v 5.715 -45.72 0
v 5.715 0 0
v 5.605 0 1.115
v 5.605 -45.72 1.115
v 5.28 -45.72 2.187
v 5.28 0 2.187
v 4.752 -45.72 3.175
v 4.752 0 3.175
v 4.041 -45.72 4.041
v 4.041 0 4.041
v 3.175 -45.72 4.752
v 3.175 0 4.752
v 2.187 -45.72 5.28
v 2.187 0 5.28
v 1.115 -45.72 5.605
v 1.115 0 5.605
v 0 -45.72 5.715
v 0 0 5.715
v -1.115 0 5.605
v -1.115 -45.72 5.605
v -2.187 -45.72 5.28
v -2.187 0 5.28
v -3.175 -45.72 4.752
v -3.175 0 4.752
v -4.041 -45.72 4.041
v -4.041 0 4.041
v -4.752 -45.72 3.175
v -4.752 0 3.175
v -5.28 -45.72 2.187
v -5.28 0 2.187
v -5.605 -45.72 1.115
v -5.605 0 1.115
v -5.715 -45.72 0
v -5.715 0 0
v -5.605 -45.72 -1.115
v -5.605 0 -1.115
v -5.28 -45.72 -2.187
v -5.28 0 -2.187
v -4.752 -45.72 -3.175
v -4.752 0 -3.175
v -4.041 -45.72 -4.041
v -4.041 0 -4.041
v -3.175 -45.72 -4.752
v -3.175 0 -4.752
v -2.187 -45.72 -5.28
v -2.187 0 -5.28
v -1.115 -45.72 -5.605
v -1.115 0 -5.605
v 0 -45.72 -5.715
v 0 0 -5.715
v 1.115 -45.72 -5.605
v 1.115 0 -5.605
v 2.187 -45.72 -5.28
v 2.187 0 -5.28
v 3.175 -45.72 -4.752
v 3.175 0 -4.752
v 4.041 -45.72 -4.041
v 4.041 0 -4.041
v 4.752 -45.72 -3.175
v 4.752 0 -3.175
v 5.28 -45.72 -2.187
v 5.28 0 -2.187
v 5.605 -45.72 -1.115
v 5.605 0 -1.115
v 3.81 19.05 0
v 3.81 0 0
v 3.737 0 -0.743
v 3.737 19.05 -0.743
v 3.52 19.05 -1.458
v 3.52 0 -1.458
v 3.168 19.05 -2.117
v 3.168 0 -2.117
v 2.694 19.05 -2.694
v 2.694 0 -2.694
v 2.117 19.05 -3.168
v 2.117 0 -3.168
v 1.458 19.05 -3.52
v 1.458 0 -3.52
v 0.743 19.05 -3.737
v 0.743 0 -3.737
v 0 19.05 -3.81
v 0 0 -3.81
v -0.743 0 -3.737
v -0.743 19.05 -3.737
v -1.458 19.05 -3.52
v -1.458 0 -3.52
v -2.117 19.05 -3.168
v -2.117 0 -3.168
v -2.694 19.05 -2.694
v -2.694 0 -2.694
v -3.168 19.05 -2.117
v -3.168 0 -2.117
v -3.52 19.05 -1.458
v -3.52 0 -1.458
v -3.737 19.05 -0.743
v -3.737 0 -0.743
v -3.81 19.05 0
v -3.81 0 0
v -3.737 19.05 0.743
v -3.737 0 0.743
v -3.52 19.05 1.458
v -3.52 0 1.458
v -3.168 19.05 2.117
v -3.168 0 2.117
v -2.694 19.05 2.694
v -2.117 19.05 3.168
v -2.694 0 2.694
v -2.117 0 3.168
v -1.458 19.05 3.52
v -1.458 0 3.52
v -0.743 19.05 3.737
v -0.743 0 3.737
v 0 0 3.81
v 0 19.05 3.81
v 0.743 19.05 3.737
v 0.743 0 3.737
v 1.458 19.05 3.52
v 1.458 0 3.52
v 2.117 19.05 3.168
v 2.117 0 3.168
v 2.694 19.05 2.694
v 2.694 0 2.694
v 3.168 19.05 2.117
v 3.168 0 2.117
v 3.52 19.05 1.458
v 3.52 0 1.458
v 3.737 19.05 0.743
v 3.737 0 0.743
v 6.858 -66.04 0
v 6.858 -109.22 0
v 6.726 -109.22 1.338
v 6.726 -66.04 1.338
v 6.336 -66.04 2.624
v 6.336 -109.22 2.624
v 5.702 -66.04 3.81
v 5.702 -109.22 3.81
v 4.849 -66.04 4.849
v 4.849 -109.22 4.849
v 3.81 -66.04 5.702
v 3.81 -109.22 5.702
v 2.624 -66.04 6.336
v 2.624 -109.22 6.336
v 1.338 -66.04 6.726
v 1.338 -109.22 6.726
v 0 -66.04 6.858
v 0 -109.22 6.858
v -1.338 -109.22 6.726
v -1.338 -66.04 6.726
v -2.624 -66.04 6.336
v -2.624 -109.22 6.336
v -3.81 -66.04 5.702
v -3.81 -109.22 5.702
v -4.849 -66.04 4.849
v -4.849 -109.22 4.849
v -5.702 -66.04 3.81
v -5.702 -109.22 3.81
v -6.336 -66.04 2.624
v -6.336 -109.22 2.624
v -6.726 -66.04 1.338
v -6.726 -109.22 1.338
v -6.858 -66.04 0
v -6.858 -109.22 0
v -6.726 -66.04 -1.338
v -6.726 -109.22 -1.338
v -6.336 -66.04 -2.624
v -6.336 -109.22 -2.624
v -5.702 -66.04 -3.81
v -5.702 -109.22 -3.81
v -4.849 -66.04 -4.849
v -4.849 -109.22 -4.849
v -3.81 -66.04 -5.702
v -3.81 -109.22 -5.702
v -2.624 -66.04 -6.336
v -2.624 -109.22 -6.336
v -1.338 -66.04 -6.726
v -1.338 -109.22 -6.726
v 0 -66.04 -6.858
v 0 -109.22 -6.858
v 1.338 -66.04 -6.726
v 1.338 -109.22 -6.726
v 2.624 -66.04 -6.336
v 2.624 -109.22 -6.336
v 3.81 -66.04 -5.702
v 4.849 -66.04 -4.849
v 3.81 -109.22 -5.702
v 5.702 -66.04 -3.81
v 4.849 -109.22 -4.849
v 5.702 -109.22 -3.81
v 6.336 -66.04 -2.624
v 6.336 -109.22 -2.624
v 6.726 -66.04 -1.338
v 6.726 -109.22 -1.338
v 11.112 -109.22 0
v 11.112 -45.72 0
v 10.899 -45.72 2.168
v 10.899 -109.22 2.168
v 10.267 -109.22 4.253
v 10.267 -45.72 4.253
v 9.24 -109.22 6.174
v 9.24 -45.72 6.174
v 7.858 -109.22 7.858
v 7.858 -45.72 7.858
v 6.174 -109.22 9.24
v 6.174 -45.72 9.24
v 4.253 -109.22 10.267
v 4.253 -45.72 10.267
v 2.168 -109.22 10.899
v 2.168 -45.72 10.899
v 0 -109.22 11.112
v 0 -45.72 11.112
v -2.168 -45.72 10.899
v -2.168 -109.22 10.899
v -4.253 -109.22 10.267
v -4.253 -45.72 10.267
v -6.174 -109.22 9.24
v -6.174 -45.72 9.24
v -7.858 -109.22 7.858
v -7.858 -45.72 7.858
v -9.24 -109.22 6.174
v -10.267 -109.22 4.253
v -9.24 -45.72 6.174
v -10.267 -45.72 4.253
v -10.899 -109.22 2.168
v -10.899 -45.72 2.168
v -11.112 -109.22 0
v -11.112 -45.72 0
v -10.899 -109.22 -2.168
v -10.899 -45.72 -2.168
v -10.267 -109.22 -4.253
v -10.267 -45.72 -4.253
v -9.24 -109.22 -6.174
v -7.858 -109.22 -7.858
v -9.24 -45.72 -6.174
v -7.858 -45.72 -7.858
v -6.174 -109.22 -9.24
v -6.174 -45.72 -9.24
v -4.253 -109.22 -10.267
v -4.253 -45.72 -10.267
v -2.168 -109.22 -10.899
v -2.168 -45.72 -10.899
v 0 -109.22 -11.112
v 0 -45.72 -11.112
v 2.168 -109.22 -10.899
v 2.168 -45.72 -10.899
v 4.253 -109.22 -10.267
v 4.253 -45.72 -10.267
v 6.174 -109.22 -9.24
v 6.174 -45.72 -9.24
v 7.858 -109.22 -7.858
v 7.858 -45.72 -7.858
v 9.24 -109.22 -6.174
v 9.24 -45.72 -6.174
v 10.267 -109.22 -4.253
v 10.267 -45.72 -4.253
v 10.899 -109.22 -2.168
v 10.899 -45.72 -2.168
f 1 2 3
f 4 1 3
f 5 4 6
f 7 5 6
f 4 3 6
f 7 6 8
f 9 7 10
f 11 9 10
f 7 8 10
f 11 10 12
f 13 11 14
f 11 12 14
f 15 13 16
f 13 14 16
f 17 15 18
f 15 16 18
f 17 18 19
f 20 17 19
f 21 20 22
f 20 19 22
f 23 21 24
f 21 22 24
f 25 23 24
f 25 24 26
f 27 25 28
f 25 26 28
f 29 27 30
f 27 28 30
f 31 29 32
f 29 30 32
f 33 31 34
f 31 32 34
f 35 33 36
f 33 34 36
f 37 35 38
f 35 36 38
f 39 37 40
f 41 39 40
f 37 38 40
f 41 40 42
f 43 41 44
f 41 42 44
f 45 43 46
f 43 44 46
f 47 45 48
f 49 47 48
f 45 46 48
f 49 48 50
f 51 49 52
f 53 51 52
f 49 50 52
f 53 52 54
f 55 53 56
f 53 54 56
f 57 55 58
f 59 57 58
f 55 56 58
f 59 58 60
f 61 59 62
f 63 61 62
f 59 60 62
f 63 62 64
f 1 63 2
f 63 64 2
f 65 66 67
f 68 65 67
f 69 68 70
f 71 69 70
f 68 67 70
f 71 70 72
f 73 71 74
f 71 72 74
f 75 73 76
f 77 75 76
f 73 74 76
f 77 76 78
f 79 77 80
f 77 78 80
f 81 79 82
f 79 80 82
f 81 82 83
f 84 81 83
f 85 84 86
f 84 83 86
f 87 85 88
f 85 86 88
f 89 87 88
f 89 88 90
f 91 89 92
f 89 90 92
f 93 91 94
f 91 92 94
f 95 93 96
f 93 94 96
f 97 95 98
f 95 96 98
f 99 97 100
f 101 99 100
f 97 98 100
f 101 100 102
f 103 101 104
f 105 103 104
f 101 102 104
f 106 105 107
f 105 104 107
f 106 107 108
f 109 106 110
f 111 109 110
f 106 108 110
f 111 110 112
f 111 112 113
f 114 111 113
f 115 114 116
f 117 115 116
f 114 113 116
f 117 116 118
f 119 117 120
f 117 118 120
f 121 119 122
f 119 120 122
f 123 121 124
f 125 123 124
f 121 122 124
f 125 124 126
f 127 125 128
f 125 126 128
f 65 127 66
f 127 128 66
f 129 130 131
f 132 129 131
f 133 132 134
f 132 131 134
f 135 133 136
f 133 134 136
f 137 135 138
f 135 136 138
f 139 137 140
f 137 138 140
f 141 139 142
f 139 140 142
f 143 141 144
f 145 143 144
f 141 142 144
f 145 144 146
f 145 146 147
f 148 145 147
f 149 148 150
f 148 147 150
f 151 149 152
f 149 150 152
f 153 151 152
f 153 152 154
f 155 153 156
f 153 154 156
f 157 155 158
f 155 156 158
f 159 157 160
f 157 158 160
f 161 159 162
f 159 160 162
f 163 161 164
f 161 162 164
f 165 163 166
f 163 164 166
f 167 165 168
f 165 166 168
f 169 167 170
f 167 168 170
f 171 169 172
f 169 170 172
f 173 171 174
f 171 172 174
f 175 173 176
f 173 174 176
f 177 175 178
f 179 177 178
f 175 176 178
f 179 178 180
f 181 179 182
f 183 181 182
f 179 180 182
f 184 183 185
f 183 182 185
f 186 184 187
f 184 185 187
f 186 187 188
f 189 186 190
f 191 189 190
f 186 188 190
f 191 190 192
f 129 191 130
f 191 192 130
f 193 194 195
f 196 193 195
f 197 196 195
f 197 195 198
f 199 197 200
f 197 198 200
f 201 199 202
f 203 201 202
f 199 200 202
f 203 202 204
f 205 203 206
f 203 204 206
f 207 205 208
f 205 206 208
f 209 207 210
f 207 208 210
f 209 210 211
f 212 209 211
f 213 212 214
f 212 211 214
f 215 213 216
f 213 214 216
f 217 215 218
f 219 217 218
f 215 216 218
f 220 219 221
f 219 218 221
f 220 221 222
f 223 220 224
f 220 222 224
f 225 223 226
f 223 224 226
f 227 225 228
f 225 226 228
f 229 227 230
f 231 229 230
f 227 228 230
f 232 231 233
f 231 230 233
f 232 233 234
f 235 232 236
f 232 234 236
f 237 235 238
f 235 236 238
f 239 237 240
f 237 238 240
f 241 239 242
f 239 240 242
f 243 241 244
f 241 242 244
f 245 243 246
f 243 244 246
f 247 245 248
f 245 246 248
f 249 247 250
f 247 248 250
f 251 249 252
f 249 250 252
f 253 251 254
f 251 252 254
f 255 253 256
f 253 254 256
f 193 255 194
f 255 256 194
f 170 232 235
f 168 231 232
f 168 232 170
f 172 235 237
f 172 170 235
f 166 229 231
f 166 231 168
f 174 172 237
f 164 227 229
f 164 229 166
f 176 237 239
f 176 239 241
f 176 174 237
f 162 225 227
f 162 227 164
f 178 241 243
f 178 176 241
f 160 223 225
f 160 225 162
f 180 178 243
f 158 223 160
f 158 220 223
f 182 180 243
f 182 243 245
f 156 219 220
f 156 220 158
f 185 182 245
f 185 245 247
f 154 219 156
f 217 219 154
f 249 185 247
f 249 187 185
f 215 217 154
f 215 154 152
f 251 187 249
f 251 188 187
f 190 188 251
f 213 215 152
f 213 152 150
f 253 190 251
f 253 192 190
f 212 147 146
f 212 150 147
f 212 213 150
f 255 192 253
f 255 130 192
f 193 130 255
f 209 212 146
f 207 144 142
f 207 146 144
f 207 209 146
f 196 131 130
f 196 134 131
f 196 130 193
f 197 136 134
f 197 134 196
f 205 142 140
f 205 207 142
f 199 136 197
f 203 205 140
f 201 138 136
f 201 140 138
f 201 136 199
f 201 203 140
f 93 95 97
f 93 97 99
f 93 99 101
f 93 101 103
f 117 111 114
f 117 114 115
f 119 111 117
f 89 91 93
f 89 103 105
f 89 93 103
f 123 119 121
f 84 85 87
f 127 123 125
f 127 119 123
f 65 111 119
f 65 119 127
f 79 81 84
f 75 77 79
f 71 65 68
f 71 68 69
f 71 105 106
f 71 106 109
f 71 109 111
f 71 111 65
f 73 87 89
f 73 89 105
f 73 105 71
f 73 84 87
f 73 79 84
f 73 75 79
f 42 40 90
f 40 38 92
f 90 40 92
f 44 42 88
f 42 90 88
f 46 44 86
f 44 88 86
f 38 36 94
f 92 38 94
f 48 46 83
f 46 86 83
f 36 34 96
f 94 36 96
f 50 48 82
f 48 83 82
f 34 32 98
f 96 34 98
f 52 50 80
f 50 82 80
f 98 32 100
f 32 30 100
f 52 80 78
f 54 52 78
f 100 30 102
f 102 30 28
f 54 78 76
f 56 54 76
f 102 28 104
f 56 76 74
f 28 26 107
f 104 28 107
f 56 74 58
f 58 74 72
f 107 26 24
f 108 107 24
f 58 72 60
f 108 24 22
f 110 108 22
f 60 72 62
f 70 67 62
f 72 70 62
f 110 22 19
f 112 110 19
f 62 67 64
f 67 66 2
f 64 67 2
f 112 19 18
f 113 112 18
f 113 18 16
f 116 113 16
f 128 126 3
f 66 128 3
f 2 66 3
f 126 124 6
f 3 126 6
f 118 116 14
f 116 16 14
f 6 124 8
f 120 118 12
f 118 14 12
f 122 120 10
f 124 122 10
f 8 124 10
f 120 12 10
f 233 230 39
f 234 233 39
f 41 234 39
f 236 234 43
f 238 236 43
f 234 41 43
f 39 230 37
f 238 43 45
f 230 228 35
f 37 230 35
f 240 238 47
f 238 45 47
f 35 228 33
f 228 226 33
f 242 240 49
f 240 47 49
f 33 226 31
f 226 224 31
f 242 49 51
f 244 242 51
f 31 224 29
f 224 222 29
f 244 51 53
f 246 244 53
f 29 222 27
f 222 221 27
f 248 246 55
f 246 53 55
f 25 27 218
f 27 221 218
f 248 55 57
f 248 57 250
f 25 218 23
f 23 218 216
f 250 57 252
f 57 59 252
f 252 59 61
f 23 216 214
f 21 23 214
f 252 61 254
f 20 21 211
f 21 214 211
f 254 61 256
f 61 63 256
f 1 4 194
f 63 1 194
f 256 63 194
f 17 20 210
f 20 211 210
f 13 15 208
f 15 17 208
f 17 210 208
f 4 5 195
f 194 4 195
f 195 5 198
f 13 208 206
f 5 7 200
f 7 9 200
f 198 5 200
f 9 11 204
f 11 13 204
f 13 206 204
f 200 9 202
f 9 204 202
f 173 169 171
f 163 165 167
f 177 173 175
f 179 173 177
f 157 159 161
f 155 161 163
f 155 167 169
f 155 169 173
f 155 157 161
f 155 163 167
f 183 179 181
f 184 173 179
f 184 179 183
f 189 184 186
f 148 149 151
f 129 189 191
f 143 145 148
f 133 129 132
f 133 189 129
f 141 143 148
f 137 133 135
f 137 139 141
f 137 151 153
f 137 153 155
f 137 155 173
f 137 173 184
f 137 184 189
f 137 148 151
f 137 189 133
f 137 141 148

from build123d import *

# Parameters (mm, degrees)
F0_R      = 5.715
F1_DEPTH  = 45.72
F3_R      = 11.1125
F4_DEPTH  = 63.5
F6_R      = 6.858
F7_DEPTH  = 43.18
F9_R      = 3.81
F10_DEPTH = 19.05


with BuildPart() as f1:
    # F0 (on Front) → F1 (new body)
    with BuildSketch(Plane.XZ):
        Circle(F0_R)
    extrude(amount=F1_DEPTH)

    # F3 (on offset) → F4 (join)
    with BuildSketch(Plane.XZ.offset(45.72)):
        Circle(F3_R)
    extrude(amount=F4_DEPTH)

    # F6 (on offset) → F7 (cut)
    with BuildSketch(Plane.XZ.offset(109.22)):
        Circle(F6_R)
    extrude(amount=-F7_DEPTH, mode=Mode.SUBTRACT)

    # F9 (on offset) → F10 (join)
    with BuildSketch(Plane(origin=(0, 0, 0), x_dir=(1, 0, 0), z_dir=(0, 1, 0))):
        Circle(F9_R)
    extrude(amount=F10_DEPTH)


solid = f1.part
